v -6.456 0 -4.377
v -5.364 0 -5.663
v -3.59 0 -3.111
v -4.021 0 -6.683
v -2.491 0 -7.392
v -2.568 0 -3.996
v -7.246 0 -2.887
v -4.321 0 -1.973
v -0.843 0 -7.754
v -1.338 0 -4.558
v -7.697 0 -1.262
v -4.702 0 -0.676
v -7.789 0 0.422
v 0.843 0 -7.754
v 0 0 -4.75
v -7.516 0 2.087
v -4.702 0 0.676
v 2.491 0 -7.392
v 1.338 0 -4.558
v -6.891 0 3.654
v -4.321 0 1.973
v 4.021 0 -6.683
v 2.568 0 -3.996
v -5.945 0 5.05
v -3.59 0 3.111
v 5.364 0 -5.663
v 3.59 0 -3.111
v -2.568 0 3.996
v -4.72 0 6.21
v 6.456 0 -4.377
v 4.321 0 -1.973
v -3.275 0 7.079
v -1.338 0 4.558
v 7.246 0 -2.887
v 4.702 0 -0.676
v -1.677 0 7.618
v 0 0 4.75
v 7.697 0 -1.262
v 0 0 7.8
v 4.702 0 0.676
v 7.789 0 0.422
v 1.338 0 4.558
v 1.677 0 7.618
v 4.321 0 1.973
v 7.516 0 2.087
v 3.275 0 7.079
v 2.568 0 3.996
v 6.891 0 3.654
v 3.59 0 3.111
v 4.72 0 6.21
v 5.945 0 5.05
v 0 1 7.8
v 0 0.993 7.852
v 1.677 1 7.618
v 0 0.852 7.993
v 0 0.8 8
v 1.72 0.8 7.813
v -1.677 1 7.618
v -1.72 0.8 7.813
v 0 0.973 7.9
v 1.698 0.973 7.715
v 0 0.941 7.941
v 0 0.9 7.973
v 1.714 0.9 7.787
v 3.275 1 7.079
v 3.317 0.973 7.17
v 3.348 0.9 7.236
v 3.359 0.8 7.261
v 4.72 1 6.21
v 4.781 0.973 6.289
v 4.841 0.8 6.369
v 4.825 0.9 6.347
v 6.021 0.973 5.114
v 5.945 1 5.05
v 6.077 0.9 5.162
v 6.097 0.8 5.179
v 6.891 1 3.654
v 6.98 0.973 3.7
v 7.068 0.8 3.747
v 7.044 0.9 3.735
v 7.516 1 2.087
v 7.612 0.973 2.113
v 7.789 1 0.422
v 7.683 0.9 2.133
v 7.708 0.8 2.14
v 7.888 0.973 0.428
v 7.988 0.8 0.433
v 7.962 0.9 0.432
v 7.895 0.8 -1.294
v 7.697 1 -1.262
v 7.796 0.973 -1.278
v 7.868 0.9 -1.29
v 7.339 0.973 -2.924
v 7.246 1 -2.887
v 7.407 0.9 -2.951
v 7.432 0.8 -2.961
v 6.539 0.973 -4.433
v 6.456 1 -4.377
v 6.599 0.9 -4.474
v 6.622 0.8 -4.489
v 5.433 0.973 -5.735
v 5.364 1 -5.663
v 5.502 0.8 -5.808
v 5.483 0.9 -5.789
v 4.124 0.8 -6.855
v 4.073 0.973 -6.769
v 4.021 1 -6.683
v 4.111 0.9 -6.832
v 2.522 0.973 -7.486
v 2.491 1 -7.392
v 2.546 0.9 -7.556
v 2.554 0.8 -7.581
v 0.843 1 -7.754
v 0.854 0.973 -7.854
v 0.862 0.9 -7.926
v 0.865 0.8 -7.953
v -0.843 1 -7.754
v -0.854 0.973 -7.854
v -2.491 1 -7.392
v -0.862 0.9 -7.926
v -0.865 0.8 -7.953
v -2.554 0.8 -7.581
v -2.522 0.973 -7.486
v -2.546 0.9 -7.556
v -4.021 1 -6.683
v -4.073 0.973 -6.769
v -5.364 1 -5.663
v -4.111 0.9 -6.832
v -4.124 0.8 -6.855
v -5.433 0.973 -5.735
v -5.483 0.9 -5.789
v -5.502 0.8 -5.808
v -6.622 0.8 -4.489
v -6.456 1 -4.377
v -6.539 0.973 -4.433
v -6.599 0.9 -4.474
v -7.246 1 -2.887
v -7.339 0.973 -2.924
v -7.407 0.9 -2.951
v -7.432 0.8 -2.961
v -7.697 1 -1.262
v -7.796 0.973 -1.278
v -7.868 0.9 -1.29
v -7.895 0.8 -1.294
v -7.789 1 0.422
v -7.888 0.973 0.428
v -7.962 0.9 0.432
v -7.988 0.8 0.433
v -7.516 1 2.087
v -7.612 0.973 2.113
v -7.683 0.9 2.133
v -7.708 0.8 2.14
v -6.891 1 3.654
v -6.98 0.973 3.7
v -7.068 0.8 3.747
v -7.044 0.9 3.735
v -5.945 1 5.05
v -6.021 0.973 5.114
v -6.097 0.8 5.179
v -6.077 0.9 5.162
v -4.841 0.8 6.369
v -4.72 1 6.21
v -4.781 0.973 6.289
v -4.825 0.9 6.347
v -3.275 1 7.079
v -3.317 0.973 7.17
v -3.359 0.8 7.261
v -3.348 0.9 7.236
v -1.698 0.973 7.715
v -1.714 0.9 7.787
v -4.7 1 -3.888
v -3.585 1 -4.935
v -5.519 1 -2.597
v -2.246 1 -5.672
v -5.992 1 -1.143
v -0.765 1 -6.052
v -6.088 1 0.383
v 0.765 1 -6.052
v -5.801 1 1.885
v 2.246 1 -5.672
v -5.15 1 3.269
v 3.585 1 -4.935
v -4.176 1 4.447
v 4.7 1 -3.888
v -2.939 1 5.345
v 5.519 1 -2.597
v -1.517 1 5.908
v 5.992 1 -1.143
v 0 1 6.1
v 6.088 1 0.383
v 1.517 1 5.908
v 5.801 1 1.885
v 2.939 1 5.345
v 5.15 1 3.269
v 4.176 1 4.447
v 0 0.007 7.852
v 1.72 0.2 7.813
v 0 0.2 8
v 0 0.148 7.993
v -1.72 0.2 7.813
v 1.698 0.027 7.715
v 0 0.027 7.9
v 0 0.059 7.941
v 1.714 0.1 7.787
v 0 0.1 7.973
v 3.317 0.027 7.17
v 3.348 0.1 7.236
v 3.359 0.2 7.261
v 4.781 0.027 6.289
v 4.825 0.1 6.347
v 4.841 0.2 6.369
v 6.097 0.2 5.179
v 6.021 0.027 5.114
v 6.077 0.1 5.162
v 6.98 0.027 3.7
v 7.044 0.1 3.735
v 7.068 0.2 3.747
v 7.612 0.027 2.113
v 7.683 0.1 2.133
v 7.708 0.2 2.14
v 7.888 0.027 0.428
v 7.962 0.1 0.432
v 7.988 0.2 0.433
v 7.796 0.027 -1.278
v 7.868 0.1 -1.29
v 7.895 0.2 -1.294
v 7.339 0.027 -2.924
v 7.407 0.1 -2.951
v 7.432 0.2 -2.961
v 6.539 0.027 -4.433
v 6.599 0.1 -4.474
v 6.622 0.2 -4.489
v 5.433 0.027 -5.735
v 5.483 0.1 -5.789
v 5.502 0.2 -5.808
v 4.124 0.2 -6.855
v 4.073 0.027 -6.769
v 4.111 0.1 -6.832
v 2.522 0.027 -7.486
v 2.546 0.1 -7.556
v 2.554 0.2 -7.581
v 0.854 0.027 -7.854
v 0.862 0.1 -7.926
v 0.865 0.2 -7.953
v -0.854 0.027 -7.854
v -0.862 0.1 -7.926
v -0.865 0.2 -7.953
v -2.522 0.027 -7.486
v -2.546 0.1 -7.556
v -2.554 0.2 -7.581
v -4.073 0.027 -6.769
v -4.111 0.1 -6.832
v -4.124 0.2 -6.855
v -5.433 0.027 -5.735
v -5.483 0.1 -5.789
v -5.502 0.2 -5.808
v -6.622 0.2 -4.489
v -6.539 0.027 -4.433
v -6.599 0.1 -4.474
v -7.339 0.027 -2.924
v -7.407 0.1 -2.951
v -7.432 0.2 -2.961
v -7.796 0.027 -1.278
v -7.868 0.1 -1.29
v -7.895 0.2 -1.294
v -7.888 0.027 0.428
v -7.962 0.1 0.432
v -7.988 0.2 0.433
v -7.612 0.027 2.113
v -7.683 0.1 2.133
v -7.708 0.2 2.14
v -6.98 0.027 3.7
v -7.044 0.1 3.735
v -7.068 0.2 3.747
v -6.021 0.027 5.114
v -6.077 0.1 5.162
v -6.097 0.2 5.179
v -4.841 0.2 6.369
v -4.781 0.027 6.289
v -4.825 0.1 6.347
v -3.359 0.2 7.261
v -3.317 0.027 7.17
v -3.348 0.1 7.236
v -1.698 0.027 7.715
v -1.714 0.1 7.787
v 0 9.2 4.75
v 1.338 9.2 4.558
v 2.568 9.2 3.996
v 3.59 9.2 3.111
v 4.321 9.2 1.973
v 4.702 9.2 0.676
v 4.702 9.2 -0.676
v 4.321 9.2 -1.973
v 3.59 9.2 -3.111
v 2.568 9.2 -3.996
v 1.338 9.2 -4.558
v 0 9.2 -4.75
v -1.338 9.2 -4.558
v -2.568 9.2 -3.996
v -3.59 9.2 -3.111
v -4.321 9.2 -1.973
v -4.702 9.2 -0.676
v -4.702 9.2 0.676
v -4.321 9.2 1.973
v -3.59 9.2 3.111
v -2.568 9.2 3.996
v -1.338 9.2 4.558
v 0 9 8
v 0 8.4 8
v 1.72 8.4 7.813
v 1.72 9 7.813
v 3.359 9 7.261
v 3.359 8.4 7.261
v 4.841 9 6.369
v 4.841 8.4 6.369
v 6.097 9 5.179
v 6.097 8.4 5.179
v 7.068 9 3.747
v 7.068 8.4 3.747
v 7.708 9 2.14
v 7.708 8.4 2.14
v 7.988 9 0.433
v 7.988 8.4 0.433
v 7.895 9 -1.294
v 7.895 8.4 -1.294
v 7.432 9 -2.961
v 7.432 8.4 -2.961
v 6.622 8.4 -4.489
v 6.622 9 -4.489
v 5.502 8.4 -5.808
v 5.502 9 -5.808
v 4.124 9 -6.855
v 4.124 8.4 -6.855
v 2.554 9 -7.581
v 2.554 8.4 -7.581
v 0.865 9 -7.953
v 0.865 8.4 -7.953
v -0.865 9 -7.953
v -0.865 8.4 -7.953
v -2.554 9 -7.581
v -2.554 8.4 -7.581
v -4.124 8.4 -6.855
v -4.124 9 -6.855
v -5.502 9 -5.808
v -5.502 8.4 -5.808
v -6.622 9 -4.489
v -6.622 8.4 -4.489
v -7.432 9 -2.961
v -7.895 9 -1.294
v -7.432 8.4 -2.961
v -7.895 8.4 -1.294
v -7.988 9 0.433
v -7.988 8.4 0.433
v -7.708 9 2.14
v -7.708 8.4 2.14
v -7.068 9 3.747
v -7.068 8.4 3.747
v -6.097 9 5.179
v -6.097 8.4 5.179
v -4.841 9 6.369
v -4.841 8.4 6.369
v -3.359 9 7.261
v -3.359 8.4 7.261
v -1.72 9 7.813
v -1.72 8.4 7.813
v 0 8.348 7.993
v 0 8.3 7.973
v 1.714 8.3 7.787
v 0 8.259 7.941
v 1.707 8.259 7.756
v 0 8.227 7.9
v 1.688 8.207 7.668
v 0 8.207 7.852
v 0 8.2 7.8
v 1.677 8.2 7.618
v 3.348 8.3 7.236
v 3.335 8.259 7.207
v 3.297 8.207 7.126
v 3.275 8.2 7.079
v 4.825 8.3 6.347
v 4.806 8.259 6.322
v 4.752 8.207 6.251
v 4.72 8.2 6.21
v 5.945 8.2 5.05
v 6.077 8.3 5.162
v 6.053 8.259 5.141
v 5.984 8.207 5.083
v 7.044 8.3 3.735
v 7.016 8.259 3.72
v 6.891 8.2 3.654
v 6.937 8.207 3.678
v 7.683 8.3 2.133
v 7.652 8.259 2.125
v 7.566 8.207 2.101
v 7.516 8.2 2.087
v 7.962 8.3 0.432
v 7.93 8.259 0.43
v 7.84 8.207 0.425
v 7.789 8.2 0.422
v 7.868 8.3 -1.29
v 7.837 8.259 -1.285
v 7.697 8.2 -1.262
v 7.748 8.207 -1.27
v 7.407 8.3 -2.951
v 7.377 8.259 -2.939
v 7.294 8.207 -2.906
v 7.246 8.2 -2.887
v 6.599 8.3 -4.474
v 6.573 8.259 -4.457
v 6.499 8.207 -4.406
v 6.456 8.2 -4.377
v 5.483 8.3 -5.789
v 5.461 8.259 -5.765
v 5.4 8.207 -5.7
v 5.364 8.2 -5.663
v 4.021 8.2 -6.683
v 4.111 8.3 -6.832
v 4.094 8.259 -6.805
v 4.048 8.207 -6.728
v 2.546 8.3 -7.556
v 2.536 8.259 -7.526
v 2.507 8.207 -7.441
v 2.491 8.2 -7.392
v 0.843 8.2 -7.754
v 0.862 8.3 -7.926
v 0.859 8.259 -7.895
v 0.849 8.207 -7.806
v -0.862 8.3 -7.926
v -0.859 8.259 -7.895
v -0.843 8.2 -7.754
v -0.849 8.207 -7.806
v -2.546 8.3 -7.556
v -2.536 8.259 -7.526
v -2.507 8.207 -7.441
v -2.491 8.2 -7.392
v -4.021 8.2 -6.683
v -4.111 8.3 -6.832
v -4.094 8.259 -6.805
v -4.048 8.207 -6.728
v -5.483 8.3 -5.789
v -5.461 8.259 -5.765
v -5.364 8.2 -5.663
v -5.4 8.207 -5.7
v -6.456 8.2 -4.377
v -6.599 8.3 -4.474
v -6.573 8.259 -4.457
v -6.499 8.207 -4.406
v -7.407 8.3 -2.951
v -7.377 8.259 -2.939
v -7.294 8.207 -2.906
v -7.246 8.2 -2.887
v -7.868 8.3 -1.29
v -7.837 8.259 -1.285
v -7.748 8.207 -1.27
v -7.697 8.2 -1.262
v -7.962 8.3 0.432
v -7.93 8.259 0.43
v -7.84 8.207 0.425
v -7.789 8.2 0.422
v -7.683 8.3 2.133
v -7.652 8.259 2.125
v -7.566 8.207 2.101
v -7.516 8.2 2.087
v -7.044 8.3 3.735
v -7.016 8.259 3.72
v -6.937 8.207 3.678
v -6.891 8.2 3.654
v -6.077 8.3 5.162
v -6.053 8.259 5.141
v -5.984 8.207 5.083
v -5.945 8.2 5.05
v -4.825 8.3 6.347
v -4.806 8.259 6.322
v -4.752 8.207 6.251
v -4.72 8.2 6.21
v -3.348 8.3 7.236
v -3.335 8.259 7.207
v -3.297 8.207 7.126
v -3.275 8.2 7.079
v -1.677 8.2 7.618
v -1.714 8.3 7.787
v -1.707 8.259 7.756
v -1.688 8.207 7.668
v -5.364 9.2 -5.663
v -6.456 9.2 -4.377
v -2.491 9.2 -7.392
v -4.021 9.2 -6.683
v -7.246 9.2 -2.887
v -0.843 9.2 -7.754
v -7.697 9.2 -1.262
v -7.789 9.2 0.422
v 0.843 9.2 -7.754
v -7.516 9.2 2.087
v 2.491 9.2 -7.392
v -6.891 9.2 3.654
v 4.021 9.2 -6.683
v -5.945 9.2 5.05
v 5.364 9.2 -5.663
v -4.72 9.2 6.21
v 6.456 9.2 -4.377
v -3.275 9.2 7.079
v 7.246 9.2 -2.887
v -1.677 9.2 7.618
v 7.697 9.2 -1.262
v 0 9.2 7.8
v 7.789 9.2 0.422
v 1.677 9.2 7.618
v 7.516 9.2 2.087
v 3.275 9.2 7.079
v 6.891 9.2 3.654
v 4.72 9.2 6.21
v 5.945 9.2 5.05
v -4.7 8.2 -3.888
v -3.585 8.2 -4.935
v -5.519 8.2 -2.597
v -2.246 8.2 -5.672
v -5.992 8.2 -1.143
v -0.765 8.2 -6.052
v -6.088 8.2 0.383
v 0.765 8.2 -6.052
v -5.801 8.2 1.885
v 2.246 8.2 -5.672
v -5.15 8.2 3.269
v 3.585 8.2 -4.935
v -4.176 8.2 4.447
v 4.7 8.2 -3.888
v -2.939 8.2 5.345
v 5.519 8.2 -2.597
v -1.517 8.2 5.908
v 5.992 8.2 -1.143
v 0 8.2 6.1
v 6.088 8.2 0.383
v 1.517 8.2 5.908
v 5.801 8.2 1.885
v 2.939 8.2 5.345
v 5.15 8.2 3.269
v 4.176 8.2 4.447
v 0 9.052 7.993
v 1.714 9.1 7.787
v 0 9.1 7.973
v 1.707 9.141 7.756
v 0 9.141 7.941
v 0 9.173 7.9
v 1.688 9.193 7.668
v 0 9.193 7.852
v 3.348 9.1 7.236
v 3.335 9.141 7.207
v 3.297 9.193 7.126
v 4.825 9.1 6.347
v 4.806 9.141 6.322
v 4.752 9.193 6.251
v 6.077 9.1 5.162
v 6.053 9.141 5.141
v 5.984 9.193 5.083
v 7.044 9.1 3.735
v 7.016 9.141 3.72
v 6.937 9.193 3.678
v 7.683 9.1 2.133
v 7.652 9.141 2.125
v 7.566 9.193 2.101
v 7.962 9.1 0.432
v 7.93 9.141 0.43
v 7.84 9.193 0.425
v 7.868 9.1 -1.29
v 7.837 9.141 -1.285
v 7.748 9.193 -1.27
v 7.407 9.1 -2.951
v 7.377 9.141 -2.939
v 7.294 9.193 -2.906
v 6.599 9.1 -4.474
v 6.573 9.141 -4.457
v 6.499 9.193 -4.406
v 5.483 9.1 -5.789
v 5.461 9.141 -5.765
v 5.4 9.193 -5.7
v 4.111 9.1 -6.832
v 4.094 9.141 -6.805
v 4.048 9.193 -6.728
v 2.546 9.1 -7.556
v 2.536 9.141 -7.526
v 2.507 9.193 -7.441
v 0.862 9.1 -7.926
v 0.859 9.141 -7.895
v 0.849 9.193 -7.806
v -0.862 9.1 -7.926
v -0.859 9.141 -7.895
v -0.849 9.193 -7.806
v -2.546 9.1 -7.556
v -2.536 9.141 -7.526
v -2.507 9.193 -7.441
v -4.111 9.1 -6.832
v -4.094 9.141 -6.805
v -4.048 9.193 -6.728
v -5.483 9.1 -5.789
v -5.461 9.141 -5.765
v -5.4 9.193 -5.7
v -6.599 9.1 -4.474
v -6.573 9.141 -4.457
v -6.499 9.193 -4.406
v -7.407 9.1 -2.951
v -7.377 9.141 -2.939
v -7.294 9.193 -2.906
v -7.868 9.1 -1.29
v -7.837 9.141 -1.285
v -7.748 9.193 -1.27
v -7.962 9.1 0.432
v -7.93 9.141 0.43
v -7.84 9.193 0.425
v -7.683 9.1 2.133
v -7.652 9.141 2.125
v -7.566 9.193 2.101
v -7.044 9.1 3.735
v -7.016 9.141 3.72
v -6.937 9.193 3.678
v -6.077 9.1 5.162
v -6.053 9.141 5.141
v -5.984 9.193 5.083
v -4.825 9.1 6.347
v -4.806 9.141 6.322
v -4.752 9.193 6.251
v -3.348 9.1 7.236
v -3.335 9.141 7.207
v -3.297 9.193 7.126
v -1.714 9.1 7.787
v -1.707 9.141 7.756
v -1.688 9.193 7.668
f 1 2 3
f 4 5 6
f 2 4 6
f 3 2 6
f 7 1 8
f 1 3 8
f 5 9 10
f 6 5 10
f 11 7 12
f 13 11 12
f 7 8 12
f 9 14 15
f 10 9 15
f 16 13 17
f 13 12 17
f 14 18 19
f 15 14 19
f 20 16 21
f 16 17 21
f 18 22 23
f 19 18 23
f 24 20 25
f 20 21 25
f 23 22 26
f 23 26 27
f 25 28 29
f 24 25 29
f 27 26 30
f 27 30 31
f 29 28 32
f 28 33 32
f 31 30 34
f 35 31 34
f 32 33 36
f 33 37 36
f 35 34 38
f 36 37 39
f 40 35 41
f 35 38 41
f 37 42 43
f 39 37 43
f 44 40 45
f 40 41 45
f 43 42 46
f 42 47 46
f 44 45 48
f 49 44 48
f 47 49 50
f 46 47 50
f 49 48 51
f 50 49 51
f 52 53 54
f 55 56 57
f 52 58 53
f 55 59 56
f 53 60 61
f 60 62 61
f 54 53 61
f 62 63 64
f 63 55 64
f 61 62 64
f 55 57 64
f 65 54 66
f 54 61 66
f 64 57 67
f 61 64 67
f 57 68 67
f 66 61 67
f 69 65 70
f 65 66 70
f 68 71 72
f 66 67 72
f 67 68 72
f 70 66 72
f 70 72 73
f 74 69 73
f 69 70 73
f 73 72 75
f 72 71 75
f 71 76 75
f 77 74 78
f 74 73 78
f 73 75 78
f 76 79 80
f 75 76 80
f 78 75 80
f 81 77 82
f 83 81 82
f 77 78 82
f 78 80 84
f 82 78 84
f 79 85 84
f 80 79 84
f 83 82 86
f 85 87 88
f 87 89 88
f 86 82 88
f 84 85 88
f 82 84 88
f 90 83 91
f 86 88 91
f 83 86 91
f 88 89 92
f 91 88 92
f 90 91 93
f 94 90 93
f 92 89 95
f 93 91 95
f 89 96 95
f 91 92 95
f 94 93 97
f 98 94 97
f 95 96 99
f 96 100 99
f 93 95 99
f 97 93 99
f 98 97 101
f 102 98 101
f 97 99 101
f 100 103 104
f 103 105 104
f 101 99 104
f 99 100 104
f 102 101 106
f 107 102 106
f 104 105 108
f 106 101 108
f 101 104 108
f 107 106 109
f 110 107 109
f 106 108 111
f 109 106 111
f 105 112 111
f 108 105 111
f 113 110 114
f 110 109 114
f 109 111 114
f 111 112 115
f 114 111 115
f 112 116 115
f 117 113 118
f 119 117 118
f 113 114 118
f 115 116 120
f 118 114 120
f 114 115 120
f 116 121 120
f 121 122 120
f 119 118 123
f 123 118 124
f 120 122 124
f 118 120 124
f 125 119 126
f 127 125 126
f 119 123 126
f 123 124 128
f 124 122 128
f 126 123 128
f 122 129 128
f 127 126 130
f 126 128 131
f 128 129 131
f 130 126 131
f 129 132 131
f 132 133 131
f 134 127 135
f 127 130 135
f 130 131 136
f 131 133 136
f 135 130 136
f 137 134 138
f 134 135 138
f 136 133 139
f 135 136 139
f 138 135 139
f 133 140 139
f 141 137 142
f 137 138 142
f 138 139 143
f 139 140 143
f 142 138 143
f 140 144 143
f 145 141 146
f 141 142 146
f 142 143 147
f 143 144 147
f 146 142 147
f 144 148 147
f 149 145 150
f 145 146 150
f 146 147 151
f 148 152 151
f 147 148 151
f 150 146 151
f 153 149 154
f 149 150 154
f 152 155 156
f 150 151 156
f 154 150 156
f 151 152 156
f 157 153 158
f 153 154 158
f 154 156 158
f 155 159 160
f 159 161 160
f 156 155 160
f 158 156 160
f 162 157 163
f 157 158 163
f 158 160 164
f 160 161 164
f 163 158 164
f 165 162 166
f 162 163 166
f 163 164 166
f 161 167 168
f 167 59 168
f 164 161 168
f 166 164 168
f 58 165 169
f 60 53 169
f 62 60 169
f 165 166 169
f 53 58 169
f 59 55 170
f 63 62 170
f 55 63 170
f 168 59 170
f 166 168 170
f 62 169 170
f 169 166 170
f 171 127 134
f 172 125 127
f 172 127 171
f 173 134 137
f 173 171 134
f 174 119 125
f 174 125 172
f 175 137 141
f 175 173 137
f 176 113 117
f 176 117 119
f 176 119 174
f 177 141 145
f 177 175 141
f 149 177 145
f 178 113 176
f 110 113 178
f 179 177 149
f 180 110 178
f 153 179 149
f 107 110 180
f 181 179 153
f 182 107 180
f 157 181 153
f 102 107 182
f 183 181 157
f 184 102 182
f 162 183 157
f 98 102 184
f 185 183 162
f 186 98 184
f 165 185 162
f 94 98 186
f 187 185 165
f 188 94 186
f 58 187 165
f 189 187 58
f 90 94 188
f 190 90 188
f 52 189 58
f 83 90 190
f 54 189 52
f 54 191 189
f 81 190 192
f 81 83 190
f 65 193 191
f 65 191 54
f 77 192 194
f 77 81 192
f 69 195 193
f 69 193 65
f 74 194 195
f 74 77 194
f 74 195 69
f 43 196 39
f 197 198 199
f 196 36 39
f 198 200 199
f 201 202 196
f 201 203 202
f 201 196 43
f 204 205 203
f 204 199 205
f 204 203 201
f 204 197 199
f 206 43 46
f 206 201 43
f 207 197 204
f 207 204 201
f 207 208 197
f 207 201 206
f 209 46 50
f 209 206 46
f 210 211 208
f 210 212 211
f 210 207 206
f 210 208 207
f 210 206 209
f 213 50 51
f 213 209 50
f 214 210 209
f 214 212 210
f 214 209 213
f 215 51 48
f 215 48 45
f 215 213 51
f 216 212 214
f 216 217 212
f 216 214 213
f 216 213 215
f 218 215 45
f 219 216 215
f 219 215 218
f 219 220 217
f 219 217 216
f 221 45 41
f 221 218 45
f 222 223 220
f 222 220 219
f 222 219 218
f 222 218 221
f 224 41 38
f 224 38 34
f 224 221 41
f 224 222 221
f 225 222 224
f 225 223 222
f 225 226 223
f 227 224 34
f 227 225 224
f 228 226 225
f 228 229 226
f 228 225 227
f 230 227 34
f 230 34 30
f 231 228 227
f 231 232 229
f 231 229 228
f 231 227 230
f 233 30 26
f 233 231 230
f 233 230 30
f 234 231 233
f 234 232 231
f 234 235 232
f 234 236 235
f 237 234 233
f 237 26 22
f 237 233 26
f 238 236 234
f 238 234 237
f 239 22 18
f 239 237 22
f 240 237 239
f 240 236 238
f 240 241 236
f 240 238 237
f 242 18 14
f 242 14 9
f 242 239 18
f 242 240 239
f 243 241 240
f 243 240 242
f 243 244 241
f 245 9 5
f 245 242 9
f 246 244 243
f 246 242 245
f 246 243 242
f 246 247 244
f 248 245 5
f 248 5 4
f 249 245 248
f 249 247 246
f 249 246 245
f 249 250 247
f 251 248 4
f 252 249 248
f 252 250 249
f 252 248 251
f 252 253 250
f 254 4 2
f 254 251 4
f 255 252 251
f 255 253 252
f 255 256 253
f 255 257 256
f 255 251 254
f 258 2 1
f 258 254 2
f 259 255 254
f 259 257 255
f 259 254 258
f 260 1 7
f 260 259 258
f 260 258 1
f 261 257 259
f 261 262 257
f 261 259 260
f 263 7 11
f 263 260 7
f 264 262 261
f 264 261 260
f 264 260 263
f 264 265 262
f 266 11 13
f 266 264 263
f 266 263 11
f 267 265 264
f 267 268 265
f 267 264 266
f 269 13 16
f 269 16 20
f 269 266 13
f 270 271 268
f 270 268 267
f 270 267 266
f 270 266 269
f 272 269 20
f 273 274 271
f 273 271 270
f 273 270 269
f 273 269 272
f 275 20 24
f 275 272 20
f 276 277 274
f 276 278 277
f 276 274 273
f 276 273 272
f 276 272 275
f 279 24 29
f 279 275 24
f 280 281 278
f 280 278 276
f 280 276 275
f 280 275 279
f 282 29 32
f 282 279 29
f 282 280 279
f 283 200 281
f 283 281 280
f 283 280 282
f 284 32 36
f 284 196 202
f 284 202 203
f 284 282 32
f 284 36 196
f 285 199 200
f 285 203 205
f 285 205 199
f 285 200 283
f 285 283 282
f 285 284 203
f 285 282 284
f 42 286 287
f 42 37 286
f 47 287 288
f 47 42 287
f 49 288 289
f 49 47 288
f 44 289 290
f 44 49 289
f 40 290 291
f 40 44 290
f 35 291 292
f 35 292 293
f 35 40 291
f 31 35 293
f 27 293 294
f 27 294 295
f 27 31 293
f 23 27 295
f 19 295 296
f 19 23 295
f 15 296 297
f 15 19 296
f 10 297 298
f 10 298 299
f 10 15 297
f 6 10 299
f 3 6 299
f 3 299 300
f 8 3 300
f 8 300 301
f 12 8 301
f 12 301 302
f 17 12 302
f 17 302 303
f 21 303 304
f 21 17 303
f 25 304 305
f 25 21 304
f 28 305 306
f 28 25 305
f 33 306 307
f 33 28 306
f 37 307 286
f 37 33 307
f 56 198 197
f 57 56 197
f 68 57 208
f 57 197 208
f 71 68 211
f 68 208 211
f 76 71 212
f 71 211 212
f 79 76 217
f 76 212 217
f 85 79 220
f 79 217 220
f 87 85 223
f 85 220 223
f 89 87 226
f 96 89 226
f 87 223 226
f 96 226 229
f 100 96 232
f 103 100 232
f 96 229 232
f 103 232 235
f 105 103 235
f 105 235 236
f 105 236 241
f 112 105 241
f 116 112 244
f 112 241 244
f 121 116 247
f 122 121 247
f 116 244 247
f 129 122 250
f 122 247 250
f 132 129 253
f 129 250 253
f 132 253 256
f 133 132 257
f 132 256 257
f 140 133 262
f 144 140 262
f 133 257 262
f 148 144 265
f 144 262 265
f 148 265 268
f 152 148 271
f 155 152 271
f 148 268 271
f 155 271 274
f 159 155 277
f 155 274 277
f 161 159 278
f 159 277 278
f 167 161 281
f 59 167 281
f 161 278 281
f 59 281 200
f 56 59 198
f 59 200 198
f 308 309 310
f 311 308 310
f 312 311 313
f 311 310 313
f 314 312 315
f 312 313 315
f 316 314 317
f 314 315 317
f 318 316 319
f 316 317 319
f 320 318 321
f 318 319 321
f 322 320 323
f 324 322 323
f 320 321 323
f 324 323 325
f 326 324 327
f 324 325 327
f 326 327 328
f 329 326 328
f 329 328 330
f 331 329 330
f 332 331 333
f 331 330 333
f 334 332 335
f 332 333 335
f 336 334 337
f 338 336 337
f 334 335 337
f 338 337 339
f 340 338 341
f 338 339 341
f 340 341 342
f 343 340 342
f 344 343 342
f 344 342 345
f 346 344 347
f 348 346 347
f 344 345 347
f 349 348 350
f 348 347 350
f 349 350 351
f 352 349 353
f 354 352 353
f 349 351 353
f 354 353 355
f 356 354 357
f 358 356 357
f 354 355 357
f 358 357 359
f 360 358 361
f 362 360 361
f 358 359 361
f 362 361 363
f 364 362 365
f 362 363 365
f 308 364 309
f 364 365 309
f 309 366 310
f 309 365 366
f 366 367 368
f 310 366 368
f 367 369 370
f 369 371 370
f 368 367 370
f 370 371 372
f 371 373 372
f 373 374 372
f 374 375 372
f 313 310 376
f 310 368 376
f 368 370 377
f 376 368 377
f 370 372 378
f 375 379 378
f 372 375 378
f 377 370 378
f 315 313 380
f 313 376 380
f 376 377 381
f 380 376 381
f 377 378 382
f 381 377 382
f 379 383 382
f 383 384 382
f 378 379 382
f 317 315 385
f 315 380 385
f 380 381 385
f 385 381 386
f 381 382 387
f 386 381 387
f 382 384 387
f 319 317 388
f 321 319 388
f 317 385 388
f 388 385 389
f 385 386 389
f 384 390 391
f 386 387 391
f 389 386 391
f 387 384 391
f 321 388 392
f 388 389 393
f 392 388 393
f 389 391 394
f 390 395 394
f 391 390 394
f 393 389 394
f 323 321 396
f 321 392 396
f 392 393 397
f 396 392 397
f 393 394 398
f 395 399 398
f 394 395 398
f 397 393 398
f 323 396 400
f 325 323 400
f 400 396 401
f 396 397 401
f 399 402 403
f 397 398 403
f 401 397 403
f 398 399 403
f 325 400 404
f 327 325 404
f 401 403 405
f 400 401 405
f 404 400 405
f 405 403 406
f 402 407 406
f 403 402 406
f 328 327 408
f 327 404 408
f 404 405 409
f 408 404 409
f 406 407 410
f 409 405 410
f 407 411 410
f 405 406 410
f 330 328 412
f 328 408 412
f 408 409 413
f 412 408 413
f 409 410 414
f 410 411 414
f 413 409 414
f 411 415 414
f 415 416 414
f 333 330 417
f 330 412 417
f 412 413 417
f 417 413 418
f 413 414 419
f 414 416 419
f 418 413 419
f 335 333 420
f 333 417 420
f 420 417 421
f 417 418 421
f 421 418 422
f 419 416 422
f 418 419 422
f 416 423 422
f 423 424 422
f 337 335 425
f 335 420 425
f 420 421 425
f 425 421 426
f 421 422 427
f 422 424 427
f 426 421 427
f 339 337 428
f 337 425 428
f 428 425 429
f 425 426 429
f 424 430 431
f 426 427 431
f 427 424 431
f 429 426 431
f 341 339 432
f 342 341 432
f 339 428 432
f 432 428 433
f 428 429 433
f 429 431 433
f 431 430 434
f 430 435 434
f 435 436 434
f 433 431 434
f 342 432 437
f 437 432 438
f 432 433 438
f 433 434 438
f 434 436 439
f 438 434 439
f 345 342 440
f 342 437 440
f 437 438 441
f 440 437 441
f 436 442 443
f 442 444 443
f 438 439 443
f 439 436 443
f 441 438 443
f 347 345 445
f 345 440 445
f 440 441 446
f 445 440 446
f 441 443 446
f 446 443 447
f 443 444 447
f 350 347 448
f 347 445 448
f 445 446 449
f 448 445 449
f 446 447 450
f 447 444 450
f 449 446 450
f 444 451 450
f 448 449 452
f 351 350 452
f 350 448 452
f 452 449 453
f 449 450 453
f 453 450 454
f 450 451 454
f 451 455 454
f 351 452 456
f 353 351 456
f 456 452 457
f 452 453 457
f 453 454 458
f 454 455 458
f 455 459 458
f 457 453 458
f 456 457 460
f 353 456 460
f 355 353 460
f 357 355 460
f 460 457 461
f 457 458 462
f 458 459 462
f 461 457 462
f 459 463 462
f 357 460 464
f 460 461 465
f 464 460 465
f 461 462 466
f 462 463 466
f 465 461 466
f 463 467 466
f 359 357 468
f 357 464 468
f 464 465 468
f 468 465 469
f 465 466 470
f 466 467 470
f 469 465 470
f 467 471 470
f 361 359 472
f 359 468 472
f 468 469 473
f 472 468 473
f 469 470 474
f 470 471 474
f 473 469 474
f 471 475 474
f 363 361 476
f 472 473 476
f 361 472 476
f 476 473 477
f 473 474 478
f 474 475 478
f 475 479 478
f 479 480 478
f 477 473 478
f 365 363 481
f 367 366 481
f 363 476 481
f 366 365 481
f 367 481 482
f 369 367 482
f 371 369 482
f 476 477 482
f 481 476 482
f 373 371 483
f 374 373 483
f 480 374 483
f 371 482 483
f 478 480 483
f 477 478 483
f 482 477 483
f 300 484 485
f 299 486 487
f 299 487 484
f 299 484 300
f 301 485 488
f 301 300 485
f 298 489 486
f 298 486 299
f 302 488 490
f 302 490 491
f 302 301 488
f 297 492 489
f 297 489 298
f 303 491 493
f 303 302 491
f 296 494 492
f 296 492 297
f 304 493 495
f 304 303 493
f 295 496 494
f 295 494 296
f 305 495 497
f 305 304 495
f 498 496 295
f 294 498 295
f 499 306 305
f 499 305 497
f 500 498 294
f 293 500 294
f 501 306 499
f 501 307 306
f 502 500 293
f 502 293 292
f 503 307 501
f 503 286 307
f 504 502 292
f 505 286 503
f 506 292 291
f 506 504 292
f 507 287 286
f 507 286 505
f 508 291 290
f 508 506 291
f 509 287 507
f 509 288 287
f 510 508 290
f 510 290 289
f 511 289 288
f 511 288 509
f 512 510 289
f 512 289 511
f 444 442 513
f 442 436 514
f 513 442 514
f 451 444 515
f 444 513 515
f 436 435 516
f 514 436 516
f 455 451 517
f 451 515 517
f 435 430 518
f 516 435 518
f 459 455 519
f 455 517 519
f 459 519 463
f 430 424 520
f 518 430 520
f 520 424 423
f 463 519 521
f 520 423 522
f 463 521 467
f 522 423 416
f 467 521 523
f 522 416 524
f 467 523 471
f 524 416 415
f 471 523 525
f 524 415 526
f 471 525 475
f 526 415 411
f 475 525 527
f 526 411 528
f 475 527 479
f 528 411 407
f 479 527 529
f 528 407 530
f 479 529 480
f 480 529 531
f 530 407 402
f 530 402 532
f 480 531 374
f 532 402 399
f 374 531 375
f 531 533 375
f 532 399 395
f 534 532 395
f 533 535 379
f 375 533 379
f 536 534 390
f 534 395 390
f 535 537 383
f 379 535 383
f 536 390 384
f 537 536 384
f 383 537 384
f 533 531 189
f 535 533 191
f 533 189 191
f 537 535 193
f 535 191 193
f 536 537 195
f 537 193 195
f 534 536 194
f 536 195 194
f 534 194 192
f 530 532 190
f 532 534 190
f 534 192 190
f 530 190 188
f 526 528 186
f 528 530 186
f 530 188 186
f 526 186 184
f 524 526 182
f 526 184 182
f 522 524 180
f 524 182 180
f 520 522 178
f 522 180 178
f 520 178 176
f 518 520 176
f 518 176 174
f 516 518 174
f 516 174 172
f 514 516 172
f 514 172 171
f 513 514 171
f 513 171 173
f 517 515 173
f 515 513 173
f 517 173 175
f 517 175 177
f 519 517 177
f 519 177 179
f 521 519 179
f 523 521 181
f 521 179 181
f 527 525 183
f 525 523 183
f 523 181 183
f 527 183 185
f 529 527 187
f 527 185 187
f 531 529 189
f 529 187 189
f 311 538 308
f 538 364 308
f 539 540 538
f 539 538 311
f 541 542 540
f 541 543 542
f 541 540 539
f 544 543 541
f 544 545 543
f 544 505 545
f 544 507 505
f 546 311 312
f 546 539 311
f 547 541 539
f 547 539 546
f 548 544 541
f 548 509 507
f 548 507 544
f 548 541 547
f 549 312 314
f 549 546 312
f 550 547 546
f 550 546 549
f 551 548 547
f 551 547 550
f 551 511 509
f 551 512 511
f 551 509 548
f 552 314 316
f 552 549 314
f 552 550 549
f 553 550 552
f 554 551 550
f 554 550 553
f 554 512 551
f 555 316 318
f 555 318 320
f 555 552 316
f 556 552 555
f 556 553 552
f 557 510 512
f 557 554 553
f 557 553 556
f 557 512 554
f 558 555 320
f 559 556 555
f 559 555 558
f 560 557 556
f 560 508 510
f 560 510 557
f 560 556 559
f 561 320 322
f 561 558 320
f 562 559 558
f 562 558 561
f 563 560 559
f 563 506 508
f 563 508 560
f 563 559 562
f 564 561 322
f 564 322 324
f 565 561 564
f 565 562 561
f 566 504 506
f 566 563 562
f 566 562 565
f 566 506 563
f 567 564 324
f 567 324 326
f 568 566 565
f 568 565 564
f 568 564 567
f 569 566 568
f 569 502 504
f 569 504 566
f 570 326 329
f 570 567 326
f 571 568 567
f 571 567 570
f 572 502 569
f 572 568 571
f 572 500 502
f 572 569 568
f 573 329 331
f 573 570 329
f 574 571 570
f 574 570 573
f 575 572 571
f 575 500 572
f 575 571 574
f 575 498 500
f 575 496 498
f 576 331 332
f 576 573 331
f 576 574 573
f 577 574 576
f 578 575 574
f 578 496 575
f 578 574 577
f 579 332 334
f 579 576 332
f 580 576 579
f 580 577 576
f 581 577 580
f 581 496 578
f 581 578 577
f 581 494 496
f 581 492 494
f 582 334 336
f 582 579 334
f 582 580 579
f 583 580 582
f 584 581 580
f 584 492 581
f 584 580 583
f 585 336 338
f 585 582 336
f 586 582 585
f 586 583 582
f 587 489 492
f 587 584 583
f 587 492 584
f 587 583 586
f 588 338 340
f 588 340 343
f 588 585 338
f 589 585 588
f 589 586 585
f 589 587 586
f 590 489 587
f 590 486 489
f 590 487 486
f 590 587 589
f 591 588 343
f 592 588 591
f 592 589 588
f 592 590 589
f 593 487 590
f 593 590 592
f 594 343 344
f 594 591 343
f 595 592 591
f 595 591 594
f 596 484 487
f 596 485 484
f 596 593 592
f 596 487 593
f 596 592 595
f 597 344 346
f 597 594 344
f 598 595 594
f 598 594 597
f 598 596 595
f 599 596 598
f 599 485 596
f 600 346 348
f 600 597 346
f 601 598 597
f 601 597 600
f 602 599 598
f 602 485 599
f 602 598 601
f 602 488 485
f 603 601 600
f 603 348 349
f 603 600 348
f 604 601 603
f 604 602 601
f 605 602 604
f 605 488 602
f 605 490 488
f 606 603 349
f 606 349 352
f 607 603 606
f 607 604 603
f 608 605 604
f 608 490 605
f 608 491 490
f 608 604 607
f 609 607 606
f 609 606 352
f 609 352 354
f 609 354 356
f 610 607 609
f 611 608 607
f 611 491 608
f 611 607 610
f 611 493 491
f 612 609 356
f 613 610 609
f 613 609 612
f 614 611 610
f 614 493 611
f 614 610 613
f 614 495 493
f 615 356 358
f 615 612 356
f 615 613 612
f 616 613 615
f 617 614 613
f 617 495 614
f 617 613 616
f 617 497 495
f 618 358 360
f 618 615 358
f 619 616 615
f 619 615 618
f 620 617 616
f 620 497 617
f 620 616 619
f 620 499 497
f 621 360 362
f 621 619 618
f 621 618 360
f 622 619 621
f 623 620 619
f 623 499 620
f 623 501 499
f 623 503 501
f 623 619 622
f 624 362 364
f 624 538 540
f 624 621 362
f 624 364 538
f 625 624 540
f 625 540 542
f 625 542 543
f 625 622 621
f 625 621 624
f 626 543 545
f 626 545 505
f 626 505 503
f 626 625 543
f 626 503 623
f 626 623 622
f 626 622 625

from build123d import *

# Parameters (mm, degrees)
ESBO_O4_R                = 6.1
ESBO_O4_R_2              = 4.75
RESSALTO_EXTRUS_O3_DEPTH = 9.2
ESBO_O4_3_R              = 8
ESBO_O4_3_R_2            = 6.1
RESSALTO_EXTRUS_O4_DEPTH = 1
RESSALTO_EXTRUS_O6_START = -1
ESBO_O5_R                = 8
ESBO_O5_R_2              = 4.75
RESSALTO_EXTRUS_O6_DEPTH = 1
FILETE5_R                = 0.2
FILETE6_R                = 0.2


with BuildPart() as part:
    # Esboço4 → Ressalto-extrusão3 (new body)
    with BuildSketch(Plane(origin=(0, 0, 0), x_dir=(1, 0, 0), z_dir=(0, 1, 0))):
        Circle(ESBO_O4_R)
        Circle(ESBO_O4_R_2, mode=Mode.SUBTRACT)
    extrude(amount=RESSALTO_EXTRUS_O3_DEPTH)

    # Esboço4<3> → Ressalto-extrusão4 (add)
    with BuildSketch(Plane(origin=(0, 0, 0), x_dir=(1, 0, 0), z_dir=(0, 1, 0))):
        Circle(ESBO_O4_3_R)
        Circle(ESBO_O4_3_R_2, mode=Mode.SUBTRACT)
    extrude(amount=RESSALTO_EXTRUS_O4_DEPTH)

    # Esboço5 → Ressalto-extrusão6 (add)
    with BuildSketch(Plane(origin=(0, 9.2, 0), x_dir=(1, 0, 0), z_dir=(0, 1, 0)).offset(RESSALTO_EXTRUS_O6_START)):
        Circle(ESBO_O5_R)
        Circle(ESBO_O5_R_2, mode=Mode.SUBTRACT)
    extrude(amount=RESSALTO_EXTRUS_O6_DEPTH)

    # Filete5
    filete5_edges = [part.edges().sort_by_distance(p)[0] for p in [
        (-8, 9.2, 0),
        (-8, 8.2, 0),
    ]]
    fillet(filete5_edges, radius=FILETE5_R)

    # Filete6
    filete6_edges = [part.edges().sort_by_distance(p)[0] for p in [
        (-8, 0, 0),
        (-8, 1, 0),
    ]]
    fillet(filete6_edges, radius=FILETE6_R)


solid = part.part
